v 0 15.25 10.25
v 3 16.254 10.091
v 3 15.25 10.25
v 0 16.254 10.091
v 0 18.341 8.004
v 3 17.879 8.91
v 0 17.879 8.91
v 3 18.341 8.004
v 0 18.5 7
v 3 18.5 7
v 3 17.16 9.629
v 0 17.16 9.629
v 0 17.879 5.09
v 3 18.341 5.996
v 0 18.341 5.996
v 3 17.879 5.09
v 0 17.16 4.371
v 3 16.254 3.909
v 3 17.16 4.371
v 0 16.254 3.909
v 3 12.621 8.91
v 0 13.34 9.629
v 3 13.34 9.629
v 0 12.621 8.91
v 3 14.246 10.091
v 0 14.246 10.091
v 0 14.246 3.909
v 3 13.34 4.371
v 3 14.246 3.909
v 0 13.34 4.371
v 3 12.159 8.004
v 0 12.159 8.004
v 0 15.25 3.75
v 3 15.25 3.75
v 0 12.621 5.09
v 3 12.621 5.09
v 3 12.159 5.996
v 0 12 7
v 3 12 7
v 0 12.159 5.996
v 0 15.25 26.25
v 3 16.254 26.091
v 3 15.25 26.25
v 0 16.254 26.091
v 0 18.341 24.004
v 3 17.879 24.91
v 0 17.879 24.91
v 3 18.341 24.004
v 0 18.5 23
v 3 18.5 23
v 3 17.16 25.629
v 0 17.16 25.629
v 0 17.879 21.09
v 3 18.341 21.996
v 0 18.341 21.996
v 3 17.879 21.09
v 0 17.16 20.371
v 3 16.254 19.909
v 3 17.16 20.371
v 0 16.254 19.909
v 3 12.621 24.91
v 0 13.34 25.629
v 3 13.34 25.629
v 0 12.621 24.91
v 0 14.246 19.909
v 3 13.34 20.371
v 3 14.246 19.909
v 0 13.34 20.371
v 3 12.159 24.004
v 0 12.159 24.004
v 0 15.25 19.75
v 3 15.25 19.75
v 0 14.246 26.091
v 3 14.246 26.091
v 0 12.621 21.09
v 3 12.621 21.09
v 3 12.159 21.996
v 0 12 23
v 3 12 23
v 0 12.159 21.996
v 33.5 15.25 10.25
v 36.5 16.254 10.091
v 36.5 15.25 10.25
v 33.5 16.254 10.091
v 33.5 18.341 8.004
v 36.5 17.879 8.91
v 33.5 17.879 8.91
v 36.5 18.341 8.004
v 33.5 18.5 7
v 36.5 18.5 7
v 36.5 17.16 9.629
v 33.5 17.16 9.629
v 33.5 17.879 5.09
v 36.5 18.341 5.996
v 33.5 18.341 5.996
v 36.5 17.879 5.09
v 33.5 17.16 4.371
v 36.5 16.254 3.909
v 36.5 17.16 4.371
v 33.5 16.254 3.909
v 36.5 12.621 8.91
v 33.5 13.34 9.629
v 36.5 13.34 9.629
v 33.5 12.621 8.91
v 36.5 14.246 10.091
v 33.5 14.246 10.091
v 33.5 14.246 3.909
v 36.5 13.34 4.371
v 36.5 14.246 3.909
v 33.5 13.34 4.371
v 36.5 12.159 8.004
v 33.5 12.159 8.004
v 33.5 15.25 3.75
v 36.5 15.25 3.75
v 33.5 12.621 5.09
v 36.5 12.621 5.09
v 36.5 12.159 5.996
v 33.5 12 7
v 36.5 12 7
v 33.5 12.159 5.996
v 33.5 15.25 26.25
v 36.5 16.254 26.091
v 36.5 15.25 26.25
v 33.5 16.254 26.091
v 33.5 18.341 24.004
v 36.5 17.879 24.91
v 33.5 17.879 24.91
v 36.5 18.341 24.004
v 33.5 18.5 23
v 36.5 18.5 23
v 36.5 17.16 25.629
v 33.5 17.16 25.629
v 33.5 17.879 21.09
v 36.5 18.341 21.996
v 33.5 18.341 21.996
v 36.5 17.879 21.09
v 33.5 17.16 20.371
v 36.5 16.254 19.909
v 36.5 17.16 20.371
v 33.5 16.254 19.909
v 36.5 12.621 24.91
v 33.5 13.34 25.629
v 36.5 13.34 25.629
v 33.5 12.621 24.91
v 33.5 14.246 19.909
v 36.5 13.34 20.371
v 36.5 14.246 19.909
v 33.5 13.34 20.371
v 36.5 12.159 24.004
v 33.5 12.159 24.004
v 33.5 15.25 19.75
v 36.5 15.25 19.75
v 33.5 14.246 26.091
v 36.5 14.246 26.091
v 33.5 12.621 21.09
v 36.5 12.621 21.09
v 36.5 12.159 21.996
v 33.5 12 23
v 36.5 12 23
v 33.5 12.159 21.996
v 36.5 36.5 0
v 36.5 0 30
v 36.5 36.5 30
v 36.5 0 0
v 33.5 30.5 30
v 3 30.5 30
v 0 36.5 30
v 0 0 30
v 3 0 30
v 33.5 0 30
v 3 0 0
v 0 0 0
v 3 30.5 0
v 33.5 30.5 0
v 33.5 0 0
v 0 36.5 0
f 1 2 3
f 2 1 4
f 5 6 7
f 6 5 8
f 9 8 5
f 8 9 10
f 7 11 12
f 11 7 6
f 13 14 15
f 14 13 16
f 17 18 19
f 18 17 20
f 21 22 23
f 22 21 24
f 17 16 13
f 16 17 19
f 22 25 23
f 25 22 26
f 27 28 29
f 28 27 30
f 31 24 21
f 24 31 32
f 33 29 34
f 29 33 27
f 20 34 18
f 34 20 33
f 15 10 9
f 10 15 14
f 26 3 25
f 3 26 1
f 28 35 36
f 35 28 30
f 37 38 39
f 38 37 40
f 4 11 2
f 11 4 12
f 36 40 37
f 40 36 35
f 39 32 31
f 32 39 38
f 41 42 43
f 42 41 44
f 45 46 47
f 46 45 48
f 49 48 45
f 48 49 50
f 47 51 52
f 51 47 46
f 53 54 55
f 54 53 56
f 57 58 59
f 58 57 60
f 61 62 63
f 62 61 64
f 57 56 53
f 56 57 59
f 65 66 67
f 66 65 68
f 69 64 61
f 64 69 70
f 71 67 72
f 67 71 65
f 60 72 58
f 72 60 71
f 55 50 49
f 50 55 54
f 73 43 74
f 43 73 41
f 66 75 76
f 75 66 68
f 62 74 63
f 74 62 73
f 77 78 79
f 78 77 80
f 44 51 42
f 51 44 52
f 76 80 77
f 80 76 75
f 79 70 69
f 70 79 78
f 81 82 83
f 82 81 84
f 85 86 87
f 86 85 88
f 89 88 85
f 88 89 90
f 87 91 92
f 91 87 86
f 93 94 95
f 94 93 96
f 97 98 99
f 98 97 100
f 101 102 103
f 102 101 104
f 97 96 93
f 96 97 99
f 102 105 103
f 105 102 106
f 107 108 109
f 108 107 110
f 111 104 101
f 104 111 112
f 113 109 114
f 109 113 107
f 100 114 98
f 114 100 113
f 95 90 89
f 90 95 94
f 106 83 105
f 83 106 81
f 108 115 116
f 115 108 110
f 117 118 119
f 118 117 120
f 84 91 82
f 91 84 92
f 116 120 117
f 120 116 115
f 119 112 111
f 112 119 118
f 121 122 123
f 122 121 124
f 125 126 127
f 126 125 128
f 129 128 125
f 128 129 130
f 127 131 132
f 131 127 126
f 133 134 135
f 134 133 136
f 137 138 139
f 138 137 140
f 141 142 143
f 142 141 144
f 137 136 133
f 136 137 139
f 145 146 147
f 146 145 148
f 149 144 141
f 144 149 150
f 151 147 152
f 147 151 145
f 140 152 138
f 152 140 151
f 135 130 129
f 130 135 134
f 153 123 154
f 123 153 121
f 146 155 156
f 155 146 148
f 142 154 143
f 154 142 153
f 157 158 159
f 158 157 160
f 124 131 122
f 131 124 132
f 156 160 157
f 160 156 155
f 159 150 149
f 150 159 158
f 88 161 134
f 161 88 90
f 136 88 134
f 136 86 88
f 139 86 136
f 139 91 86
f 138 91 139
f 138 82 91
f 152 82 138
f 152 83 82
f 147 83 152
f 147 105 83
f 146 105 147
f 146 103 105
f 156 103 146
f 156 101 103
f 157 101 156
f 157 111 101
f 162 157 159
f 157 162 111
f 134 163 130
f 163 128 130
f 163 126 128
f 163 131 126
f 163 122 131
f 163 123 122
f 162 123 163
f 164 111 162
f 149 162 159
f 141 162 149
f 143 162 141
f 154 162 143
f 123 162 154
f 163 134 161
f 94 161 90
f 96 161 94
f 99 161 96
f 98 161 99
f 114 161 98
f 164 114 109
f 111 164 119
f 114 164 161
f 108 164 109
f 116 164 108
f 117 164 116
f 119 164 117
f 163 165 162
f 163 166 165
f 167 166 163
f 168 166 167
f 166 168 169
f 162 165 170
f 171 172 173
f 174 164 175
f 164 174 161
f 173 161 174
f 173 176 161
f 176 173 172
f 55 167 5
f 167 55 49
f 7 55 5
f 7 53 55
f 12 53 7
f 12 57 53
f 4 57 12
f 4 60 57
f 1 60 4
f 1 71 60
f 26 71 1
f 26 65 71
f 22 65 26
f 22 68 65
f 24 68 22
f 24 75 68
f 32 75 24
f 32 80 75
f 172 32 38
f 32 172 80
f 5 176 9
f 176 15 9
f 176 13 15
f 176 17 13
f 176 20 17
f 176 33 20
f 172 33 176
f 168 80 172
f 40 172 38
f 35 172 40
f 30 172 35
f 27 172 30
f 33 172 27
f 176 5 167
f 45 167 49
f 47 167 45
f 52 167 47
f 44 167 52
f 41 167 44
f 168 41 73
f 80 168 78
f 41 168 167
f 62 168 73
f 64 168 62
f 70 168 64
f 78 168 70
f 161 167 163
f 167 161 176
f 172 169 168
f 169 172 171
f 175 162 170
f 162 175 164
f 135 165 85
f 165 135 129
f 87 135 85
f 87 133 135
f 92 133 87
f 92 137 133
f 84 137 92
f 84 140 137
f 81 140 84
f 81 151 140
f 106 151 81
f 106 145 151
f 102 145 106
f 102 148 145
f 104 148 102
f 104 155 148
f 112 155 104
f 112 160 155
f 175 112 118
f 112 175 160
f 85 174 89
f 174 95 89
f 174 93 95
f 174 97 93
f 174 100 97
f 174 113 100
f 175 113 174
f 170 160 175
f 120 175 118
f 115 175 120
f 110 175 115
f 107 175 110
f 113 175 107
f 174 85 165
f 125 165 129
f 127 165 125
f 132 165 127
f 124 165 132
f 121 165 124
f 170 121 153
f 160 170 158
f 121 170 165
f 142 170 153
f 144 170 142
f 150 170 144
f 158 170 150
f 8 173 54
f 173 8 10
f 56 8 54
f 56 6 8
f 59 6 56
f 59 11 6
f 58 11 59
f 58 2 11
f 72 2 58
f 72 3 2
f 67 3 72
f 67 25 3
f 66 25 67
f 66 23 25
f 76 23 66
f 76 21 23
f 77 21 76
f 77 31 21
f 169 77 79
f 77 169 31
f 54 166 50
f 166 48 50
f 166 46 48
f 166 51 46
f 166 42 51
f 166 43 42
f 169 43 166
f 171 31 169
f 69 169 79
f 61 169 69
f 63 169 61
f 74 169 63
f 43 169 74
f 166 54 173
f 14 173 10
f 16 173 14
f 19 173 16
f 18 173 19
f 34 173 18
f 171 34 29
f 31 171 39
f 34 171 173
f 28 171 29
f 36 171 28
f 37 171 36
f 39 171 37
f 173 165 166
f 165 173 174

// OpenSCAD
// file: ../../parameters.scad
maximum_printable_size = 150;

layer_thickness = 0.3;
global_clearance = 0.5;


//Screw diameter and nut for M10 [mm]
M10_screw_diameter = 10.4;
M10_head_height = 10;
M10_head_diameter = 16+0.5;
M10_nut_height = 10.5;
M10_nut_diameter = 25.5;
M10_nut_pocket = 22.3;

//Screw diameter for M8 [mm]
M8_screw_diameter = 8.6;
M8_head_height = 8;
M8_head_diameter = 13.5;
M8_nut_height = 7.5;
M8_square_nut_thin_height = 4.5;
M8_nut_diameter = 14.4 + 0.5;
M8_nut_pocket = 13 + 0.5;
M8_washer_diameter = 16;
M8_washer_thickness = 1.5;


//Screw diameter and nut for M6 [mm]
M6_screw_diameter=6.5;
M6_head_diameter = 10+0.5;
M6_head_height = 6;
M6_nut_height = 4.9;
M6_nut_diameter = 11.8;
M6_nut_pocket = 10.4;
M6_square_nut_height = 3;
M6_square_nut_diameter = 10;
M6_washer_thickness = 1.6;

//Screw diameter and nut for M5 [mm]
M5_screw_diameter=5.5;
M5_head_height = 5;
M5_head_diameter = 13+0.5;
M5_nut_height = 4.5;
M5_nut_diameter = 9.4;
M5_nut_pocket = 8.4;

//Screw diameter and nut for M4 [mm]
M4_screw_diameter=4.5;
M4_screw_head_height = 4;
M4_nut_height = 3.2;
M4_nut_diameter = 8.4;
M4_nut_pocket = 7.5;

//Screw diameter and nut for M3 [mm]
M3_screw_diameter = 3.2;
M3_nut_height = 2.7;
M3_nut_diameter = 6.6;
M3_nut_pocket = 5.6;
M3_screw_head_height = 3;

//Screw diameter and nut for M2,5 [mm]
M2_5_screw_diameter = 2.7;
M2_5_nut_height = 2.3;
M2_5_nut_diameter = 6;
M2_5_nut_pocket = 5.5;

// kulove lozisko

bearing_efsm_08_h = 33+1;
bearing_efsm_08_m = 22;
bearing_efsm_08_db = 18;
bearing_efsm_08_ag = 10.5;
bearing_efsm_08_n = M4_screw_diameter;
bearing_efsm_08_a1 = 5.5;
bearing_efsm_08_d = 8.25;
bearing_efsm_08_B = 8; // ball height

bearing_efsm_10_h = 38+1;
bearing_efsm_10_m = 26;
bearing_efsm_10_db = 21.9;
bearing_efsm_10_ag = 12+0.2;
bearing_efsm_10_n = M5_screw_diameter;
bearing_efsm_10_a1 = 6.5;
bearing_efsm_10_d = 10.25;


bearing_efsm_12_width = 40+1;
bearing_efsm_12_h = bearing_efsm_12_width;
bearing_efsm_12_boltd = 28/2; // polovina vzdalenosti mezi srouby
bearing_efsm_12_m = bearing_efsm_12_boltd*2;
bearing_efsm_12_db = 25;
bearing_efsm_12_ag = 13;
bearing_efsm_12_a1 = 7;
bearing_efsm_12_n = M5_screw_diameter;
bearing_efsm_12_d = 12.15;
bearing_efsm_12_B = 10; // ball height
bearing_efsm_space = 1;

bearing_efsm_17_width = 54+1;
bearing_efsm_17_h = bearing_efsm_17_width;
bearing_efsm_17_boltd = 38/2; // polovina vzdalenosti mezi srouby
bearing_efsm_17_m = bearing_efsm_17_boltd*2;
bearing_efsm_17_db = 35;
bearing_efsm_17_ag = 18;
bearing_efsm_17_n = M6_screw_diameter;
bearing_efsm_17_a1 = 10;
bearing_efsm_17_B = 17; // ball height

//limcove lozisko
bearing_EFOM_10_L=26; //celkova sirka zakladny
bearing_EFOM_10_d1=10.3;//diametr otvoru real=10 mm
bearing_EFOM_10_dB=22;//diametr vystupku pro ulozeni lozika
bearing_EFOM_10_H=52;//celková delka zakladny
bearing_EFOM_10_J=36;// hole pitch
bearing_EFOM_10_A1=6.5;//vyska pouzdra
bearing_EFOM_10_Ag=12;//celkova vyska
bearing_EFOM_10_N1=5;//sirka otvoru pro sroub
bearing_EFOM_10_N2=8;//delka otvoru pro sroub
bearing_EFOM_10_m=36;//roztec der pro sroub
bearing_EFOM_10_h=9;//vyska lozika


608_bearing_outer_diameter = 22.3;
608_bearing_inner_diameter = 16;
608_bearing_thickness = 7.1;


// 20 KG servo parameters

servo_20kg_axis_offset = 9.375; // jak je osa mimo stredu
servo_20kg_body_x = 42;
servo_20kg_body_y = 21;
servo_20kg_body_z = 40;
servo_20kg_thread_x = 49/2;
servo_20kg_thread_y = 10/2;
servo_20kg_body_below = 10; // jak hluboko je tělo serva pod drzaky na srouby
servo_20kg_below = 25.8; // jak hluboko je páka serva pod drzaky na srouby

servo_20kg_bolt_d = 2.5+0.3;
servo_20kg_nut_d = 5+0.3;


//strain gauge
strain_gauge_width = 12.7;
strain_gauge_length = 75.1;
strain_gauge_screw_distance = 10;

//ALU profile
ALU_profile_width = 30.5;
ALU_profile_holder_wall_thickness = 3;
ALU_profile_groove_width = 8;

//pillow block bearing
//https://www.igus.eu/product/372
//Part no. KSTM-08
KSTM08_screws_distance = 33;         //m
KSTM08_screws_holes_diameter = 4.5;  //d2
KSTM08_flange_thickness = 6;         //h3
KSTM08_case_width = 9;               //C1
KSTM08_case_length = 47;             //a
KSTM08_ball_width = 12;              //B
KSTM08_ball_hole_diameter = 7.85;    //d1


//ložiska pro malý rotor
bearing_outer_diameter = 10.2;    // Rozměr B1 v nákresu s přídavkem na toleranci otvoru
bearing_thickness = 4;        // Rozměr B2 v nákresu
//bearing_shaft_length = 19.5;    // Rozměr B3 v nákresu, Originalni hodnota 19.5
bearing_shaft_length = 20;    // Rozměr B3 v nákresu


//parametry víčka s telemetrickou anténou
S01_sila_materialu=1.2;
S01_vyska_horni_zavit=10;
S01_hloubka_zavitu=4;
S01_prumer_vnitrni=50;
LO_spodni_prumer=17.2;
LO_vyska_bez_krytu=15;
S01_tolerance_zavit=1.5;
R01_vyska_prekryti_statoru=10;

g3_0_cone1 = 70;
g3_0_srcew_dist = 55;



// scale parameters
base_length = 500;
mid_base_width = 500;
mid_base_height = 200;
mid_base_length = 500;
mid_base_x_offset = 50;
base_mid_base_hinge_offset = 50;
tower_height = 185;
tower_angle = atan((mid_base_width/2-ALU_profile_width-10)/tower_height);
tower_arm_length = tower_height/cos(tower_angle);
tower_drag_z_offset = 22;
electro_box_length = 225;
electro_box_width = 165;
electro_box_height = 51.5;

// calibration device parameters
calibration_arm_x_offset = 140;
calibration_arm_y_offset = 50;
// main file
include <../../parameters.scad>

module ALU_profile_holder_side(height) {
    wall_thickness = ALU_profile_holder_wall_thickness;
    
    //díry na přišroubování k Al profilům
    module screws_holes(diameter) {
        translate([0, 0, 7])
            rotate([90, 0, 90])
                cylinder(d=diameter, h=wall_thickness*2, center=true, $fn=20);
        
        translate([0, 0, height-7])
            rotate([90, 0, 90])
                cylinder(d=diameter, h=wall_thickness*2, center=true, $fn=20);
    }
    
    difference() {
        cube([ALU_profile_width+wall_thickness*2, ALU_profile_width + wall_thickness*2, height]);

        translate([wall_thickness, -0.1, -0.1])
            cube([ALU_profile_width, ALU_profile_width + 0.1, height + 0.2]);
        
        translate([wall_thickness*0.5, ALU_profile_width/2, 0]) {
            screws_holes(M6_screw_diameter);
            translate([ALU_profile_width+wall_thickness, 0, 0]) {
                screws_holes(M6_screw_diameter);
            }
        }
    }
}

ALU_profile_holder_side(30);
